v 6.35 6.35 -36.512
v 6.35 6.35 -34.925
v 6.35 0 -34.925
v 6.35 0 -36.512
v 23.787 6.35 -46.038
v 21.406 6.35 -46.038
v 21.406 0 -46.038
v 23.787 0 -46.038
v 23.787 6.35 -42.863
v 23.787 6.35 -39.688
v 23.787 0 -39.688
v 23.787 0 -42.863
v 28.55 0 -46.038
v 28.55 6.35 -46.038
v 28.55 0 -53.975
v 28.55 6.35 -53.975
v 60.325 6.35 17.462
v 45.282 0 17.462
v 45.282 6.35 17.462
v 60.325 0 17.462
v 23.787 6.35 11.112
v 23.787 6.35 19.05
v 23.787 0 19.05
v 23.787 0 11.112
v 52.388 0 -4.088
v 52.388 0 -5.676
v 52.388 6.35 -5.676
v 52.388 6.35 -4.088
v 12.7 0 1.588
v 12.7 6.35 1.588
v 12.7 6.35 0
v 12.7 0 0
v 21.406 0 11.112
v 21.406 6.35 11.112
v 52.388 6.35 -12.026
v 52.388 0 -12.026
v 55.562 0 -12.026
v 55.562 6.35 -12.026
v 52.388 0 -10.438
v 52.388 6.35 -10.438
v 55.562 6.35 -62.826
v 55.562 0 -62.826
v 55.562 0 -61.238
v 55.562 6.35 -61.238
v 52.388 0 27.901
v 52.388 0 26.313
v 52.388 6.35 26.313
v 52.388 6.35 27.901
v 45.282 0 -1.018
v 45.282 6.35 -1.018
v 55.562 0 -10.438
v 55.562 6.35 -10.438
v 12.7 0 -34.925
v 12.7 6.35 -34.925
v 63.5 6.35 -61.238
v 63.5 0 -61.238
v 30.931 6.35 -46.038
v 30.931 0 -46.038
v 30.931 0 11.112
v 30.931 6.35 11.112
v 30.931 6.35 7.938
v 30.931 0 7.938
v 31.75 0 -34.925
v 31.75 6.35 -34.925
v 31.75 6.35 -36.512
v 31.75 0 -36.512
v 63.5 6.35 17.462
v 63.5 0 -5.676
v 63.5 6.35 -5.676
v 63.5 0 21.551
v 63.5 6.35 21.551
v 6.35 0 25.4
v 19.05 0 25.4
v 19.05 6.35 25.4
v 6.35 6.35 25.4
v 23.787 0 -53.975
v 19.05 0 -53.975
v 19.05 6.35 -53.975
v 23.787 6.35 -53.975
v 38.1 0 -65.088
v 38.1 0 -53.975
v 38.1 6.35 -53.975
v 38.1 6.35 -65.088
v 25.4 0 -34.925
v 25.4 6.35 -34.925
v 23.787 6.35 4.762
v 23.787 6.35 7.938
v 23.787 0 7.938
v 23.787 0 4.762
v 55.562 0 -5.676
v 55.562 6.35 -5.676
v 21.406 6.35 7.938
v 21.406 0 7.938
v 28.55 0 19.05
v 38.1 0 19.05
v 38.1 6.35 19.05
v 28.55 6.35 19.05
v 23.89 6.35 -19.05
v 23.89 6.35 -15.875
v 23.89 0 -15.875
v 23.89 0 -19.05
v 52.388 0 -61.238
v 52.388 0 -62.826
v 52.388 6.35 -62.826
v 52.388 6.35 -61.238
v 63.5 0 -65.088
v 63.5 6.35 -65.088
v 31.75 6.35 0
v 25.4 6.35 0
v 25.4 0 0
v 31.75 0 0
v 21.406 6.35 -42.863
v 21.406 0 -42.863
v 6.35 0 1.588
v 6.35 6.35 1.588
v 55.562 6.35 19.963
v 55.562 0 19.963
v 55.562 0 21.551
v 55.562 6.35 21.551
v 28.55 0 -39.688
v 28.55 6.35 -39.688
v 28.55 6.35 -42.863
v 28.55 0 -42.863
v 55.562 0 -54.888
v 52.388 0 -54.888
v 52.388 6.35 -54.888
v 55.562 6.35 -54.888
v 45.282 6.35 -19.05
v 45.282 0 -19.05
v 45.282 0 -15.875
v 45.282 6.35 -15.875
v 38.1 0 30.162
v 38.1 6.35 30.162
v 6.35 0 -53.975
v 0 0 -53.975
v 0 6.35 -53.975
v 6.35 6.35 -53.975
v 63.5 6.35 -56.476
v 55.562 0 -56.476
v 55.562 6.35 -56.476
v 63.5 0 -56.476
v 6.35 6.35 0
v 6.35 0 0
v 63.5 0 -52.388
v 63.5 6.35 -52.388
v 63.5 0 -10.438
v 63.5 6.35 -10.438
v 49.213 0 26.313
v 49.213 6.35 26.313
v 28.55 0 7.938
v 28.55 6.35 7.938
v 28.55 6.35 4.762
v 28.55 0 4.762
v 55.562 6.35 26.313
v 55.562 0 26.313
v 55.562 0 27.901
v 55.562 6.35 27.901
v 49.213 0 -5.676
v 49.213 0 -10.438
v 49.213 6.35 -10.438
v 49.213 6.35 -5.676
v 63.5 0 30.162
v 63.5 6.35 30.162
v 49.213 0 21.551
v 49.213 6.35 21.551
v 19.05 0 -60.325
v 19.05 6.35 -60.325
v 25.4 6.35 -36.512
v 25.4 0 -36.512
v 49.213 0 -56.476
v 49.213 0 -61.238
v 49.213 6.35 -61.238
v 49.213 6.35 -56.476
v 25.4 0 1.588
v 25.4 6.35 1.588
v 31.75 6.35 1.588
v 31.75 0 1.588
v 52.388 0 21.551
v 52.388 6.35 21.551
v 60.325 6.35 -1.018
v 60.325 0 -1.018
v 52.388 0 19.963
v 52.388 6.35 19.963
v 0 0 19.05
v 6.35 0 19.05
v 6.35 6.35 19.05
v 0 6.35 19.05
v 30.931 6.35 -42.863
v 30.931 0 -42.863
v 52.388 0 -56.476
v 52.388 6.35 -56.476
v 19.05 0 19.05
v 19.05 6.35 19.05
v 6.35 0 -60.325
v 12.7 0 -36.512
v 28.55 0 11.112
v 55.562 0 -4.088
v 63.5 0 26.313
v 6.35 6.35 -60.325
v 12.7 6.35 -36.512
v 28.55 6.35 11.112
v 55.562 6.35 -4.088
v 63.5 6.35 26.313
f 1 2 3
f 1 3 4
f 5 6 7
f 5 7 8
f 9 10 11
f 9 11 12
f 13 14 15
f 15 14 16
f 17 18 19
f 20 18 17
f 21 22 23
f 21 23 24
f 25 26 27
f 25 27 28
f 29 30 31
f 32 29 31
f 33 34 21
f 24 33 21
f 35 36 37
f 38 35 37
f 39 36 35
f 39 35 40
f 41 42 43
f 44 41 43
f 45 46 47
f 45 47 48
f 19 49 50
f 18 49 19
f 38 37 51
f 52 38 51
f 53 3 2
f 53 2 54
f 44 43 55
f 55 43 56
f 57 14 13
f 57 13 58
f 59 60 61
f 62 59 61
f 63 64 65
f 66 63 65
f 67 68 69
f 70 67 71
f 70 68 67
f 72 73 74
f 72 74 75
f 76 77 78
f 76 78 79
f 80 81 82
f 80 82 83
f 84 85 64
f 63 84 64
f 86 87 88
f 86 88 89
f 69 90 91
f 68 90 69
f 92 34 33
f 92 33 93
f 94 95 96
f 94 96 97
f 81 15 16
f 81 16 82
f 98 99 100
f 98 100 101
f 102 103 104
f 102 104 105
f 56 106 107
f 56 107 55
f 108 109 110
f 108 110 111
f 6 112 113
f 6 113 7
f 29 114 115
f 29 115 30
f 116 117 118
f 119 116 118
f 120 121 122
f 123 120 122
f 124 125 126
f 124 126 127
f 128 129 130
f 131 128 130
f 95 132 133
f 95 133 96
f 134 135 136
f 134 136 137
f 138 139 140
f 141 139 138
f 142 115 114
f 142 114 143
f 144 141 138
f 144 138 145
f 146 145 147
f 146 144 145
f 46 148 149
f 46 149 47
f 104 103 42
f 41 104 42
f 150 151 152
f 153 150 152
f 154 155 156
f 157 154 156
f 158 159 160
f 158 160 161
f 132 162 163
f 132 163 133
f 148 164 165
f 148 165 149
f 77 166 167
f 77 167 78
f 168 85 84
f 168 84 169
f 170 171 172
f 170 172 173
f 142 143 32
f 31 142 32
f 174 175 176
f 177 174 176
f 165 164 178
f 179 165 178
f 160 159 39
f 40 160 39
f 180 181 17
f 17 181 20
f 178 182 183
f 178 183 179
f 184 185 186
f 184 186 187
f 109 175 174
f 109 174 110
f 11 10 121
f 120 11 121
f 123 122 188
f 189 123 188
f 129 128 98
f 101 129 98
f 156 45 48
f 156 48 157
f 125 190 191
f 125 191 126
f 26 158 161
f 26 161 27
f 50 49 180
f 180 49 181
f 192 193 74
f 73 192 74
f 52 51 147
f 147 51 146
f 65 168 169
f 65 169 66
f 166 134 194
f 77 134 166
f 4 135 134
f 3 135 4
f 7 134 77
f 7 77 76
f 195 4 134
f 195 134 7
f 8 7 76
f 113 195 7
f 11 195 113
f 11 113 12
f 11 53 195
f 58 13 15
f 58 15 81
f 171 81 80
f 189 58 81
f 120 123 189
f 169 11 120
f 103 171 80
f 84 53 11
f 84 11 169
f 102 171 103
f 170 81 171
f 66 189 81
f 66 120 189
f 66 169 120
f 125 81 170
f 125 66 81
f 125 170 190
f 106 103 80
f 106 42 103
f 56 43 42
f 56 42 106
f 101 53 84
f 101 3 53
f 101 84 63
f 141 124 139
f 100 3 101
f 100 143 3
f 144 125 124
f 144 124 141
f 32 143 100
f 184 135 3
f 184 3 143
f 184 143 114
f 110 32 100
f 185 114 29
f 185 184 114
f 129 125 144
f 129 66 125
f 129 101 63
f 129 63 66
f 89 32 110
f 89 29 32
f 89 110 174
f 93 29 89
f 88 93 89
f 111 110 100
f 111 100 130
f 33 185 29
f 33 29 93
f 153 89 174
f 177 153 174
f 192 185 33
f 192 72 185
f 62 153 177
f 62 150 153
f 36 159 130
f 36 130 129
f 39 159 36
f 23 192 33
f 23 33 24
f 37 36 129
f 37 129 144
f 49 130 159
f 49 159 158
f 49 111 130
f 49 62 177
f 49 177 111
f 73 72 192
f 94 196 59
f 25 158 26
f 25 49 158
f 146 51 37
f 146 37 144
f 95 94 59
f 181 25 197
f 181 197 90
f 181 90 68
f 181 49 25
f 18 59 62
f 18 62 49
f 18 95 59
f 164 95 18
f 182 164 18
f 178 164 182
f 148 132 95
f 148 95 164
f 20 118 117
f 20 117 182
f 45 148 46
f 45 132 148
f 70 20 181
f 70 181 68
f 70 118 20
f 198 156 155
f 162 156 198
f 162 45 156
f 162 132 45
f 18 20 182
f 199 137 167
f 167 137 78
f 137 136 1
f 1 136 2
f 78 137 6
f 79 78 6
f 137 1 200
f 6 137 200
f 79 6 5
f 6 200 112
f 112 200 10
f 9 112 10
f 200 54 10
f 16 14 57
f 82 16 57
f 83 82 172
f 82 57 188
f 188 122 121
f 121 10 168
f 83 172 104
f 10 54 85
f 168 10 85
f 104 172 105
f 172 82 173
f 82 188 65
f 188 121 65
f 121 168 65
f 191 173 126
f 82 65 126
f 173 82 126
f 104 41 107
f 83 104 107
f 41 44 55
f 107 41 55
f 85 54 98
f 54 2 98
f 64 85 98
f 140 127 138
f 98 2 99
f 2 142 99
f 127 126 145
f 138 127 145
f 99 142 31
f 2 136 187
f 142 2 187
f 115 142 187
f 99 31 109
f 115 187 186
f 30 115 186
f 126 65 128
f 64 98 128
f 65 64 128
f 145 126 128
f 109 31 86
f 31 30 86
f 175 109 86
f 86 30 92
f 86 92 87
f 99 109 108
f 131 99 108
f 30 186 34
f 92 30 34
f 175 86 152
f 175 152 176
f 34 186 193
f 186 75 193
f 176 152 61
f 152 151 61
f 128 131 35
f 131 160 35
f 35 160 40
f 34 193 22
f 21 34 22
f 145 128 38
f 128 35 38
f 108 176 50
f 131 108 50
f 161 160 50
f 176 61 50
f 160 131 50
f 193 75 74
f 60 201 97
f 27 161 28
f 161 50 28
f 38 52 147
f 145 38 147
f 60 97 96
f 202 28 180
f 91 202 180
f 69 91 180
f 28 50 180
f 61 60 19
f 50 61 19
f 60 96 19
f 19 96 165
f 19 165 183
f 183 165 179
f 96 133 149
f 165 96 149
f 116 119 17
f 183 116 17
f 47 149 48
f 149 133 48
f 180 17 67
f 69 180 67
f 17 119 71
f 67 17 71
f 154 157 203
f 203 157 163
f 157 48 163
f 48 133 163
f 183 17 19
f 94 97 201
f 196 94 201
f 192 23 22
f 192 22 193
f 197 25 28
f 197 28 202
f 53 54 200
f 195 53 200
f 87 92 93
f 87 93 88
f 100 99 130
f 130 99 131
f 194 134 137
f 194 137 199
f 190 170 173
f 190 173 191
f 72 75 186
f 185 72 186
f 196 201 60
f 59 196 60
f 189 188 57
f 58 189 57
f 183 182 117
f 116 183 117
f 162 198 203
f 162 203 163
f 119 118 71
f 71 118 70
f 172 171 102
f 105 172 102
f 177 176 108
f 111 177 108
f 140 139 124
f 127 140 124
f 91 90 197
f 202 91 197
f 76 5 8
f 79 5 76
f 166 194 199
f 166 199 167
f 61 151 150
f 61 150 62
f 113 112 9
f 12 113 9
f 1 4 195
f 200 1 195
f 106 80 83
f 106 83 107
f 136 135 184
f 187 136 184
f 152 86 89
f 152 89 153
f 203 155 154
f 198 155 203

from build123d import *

# Parameters (mm, degrees)
BOSS_EXTRUDE1_DEPTH = 6.35
SKETCH2_W           = 6.35
SKETCH2_H           = 1.5875
CUT_EXTRUDE1_DEPTH  = 6.35
BOSS_EXTRUDE2_START = -6.35
SKETCH4_W           = 24.326613467
SKETCH4_H           = 69.85
BOSS_EXTRUDE2_DEPTH = 6.35
SKETCH5_W           = 25.4
SKETCH5_H           = 3.175
CUT_EXTRUDE3_DEPTH  = 6.35
SKETCH7_W           = 19.923596682
SKETCH7_H           = 95.25
CUT_EXTRUDE4_DEPTH  = 6.35
SKETCH8_W           = 15.043251586
SKETCH8_H           = 69.85
CUT_EXTRUDE5_DEPTH  = 6.35
SKETCH9_W           = 3.175
SKETCH9_H           = 95.25
BOSS_EXTRUDE3_DEPTH = 6.35
SKETCH10_W          = 17.539756693
SKETCH10_H          = 95.25
CUT_EXTRUDE7_DEPTH  = 6.35
SKETCH3_W           = 4.7625
SKETCH3_H           = 14.2875
SKETCH3_W_2         = 9.525
SKETCH3_H_2         = 3.175
CUT_EXTRUDE8_DEPTH  = 6.35
SKETCH11_W          = 14.2875
SKETCH11_H          = 4.7625
SKETCH11_W_2        = 3.175
SKETCH11_H_2        = 7.9375
CUT_EXTRUDE9_DEPTH  = 6.35
SKETCH13_W          = 15.043251586
SKETCH13_H          = 51.369192813
BOSS_EXTRUDE4_DEPTH = 6.35
SKETCH14_W          = 14.2875
SKETCH14_H          = 4.7625
SKETCH14_W_2        = 3.175
SKETCH14_H_2        = 7.9375
CUT_EXTRUDE10_DEPTH = 6.35


with BuildPart() as part:
    # Sketch1 → Boss-Extrude1 (new body)
    with BuildSketch(Plane(origin=(0, 0, 0), x_dir=(1, 0, 0), z_dir=(0, 1, 0))):
        Polygon((38.1, 65.0875), (84.214756693, 65.0875), (84.214756693, -30.1625), (38.1, -30.1625), (38.1, -19.05), (19.05, -19.05), (19.05, -25.4), (6.35, -25.4), (6.35, -19.05), (0, -19.05), (0, 0), (0, 34.925), (0, 53.975), (6.35, 53.975), (6.35, 60.325), (19.05, 60.325), (19.05, 53.975), (38.1, 53.975), align=None)
        Polygon((38.1, 34.925), (44.45, 38.591174209), (44.45, 52.3875), (74.689756693, 52.3875), (77.864756693, 50.8), (77.864756693, -15.875), (74.689756693, -17.4625), (44.45, -17.4625), (44.45, -3.666174209), (38.1, 0), align=None, mode=Mode.SUBTRACT)
    extrude(amount=BOSS_EXTRUDE1_DEPTH)

    # Sketch2 → Cut-Extrude1 (cut)
    with BuildSketch(Plane(origin=(0, 6.35, 0), x_dir=(1, 0, 0), z_dir=(0, 1, 0))):
        with Locations((9.525, 35.71875)):
            Rectangle(SKETCH2_W, SKETCH2_H)
        with Locations((9.525, -0.79375)):
            Rectangle(SKETCH2_W, SKETCH2_H)
        with Locations((28.575, 35.71875)):
            Rectangle(SKETCH2_W, SKETCH2_H)
        with Locations((28.575, -0.79375)):
            Rectangle(SKETCH2_W, SKETCH2_H)
    extrude(amount=-CUT_EXTRUDE1_DEPTH, mode=Mode.SUBTRACT)

    # Sketch4 → Boss-Extrude2 (add)
    with BuildSketch(Plane(origin=(0, 6.35, 0), x_dir=(1, 0, 0), z_dir=(0, 1, 0)).offset(BOSS_EXTRUDE2_START)):
        with Locations((49.82644996, 17.4625)):
            Rectangle(SKETCH4_W, SKETCH4_H)
    extrude(amount=BOSS_EXTRUDE2_DEPTH)

    # Sketch5 → Cut-Extrude3 (cut)
    with BuildSketch(Plane(origin=(0, 6.35, 0), x_dir=(1, 0, 0), z_dir=(0, 1, 0))):
        with Locations((61.989756693, 17.4625)):
            Rectangle(SKETCH5_W, SKETCH5_H)
        with Locations((36.589756693, 17.4625)):
            Rectangle(SKETCH5_W, SKETCH5_H)
    extrude(amount=-CUT_EXTRUDE3_DEPTH, mode=Mode.SUBTRACT)

    # Sketch7 → Cut-Extrude4 (cut)
    with BuildSketch(Plane(origin=(0, 6.35, 0), x_dir=(1, 0, 0), z_dir=(0, 1, 0))):
        with Locations((91.001555034, 17.4625)):
            Rectangle(SKETCH7_W, SKETCH7_H)
    extrude(amount=-CUT_EXTRUDE4_DEPTH, mode=Mode.SUBTRACT)

    # Sketch8 → Cut-Extrude5 (cut)
    with BuildSketch(Plane.XZ):
        with Locations((52.803374207, -17.4625)):
            Rectangle(SKETCH8_W, SKETCH8_H)
    extrude(amount=-CUT_EXTRUDE5_DEPTH, mode=Mode.SUBTRACT)

    # Sketch9 → Boss-Extrude3 (add)
    with BuildSketch(Plane.XZ):
        with Locations((61.9125, -17.4625)):
            Rectangle(SKETCH9_W, SKETCH9_H)
    extrude(amount=-BOSS_EXTRUDE3_DEPTH)

    # Sketch10 → Cut-Extrude7 (cut)
    with BuildSketch(Plane.XZ):
        with Locations((72.269878347, -17.4625)):
            Rectangle(SKETCH10_W, SKETCH10_H)
    extrude(amount=-CUT_EXTRUDE7_DEPTH, mode=Mode.SUBTRACT)

    # Sketch3 → Cut-Extrude8 (cut)
    with BuildSketch(Plane(origin=(0, 6.35, 0), x_dir=(1, 0, 0), z_dir=(0, 1, 0))):
        with Locations((26.168267374, 46.83125)):
            Rectangle(SKETCH3_W, SKETCH3_H)
        with Locations((26.168267374, 44.45)):
            Rectangle(SKETCH3_W_2, SKETCH3_H_2)
        with Locations((26.168267374, -9.525)):
            Rectangle(SKETCH3_W_2, SKETCH3_H_2)
        with Locations((26.168267374, -11.90625)):
            Rectangle(SKETCH3_W, SKETCH3_H)
    extrude(amount=-CUT_EXTRUDE8_DEPTH, mode=Mode.SUBTRACT)

    # Sketch11 → Cut-Extrude9 (cut)
    with BuildSketch(Plane.XZ):
        with Locations((56.35625, 23.932056084)):
            Rectangle(SKETCH11_W, SKETCH11_H)
        with Locations((53.975, 23.932056084)):
            Rectangle(SKETCH11_W_2, SKETCH11_H_2)
        with Locations((53.975, -58.857056084)):
            Rectangle(SKETCH11_W_2, SKETCH11_H_2)
        with Locations((56.35625, -58.857056084)):
            Rectangle(SKETCH11_W, SKETCH11_H)
    extrude(amount=-CUT_EXTRUDE9_DEPTH, mode=Mode.SUBTRACT)

    # Sketch13 → Boss-Extrude4 (add)
    with BuildSketch(Plane.XZ):
        with Locations((52.803374207, -26.702903594)):
            Rectangle(SKETCH13_W, SKETCH13_H)
    extrude(amount=-BOSS_EXTRUDE4_DEPTH)

    # Sketch14 → Cut-Extrude10 (cut)
    with BuildSketch(Plane.XZ):
        with Locations((56.35625, -8.057056084)):
            Rectangle(SKETCH14_W, SKETCH14_H)
        with Locations((53.975, -8.057056084)):
            Rectangle(SKETCH14_W_2, SKETCH14_H_2)
    extrude(amount=-CUT_EXTRUDE10_DEPTH, mode=Mode.SUBTRACT)


solid = part.part
